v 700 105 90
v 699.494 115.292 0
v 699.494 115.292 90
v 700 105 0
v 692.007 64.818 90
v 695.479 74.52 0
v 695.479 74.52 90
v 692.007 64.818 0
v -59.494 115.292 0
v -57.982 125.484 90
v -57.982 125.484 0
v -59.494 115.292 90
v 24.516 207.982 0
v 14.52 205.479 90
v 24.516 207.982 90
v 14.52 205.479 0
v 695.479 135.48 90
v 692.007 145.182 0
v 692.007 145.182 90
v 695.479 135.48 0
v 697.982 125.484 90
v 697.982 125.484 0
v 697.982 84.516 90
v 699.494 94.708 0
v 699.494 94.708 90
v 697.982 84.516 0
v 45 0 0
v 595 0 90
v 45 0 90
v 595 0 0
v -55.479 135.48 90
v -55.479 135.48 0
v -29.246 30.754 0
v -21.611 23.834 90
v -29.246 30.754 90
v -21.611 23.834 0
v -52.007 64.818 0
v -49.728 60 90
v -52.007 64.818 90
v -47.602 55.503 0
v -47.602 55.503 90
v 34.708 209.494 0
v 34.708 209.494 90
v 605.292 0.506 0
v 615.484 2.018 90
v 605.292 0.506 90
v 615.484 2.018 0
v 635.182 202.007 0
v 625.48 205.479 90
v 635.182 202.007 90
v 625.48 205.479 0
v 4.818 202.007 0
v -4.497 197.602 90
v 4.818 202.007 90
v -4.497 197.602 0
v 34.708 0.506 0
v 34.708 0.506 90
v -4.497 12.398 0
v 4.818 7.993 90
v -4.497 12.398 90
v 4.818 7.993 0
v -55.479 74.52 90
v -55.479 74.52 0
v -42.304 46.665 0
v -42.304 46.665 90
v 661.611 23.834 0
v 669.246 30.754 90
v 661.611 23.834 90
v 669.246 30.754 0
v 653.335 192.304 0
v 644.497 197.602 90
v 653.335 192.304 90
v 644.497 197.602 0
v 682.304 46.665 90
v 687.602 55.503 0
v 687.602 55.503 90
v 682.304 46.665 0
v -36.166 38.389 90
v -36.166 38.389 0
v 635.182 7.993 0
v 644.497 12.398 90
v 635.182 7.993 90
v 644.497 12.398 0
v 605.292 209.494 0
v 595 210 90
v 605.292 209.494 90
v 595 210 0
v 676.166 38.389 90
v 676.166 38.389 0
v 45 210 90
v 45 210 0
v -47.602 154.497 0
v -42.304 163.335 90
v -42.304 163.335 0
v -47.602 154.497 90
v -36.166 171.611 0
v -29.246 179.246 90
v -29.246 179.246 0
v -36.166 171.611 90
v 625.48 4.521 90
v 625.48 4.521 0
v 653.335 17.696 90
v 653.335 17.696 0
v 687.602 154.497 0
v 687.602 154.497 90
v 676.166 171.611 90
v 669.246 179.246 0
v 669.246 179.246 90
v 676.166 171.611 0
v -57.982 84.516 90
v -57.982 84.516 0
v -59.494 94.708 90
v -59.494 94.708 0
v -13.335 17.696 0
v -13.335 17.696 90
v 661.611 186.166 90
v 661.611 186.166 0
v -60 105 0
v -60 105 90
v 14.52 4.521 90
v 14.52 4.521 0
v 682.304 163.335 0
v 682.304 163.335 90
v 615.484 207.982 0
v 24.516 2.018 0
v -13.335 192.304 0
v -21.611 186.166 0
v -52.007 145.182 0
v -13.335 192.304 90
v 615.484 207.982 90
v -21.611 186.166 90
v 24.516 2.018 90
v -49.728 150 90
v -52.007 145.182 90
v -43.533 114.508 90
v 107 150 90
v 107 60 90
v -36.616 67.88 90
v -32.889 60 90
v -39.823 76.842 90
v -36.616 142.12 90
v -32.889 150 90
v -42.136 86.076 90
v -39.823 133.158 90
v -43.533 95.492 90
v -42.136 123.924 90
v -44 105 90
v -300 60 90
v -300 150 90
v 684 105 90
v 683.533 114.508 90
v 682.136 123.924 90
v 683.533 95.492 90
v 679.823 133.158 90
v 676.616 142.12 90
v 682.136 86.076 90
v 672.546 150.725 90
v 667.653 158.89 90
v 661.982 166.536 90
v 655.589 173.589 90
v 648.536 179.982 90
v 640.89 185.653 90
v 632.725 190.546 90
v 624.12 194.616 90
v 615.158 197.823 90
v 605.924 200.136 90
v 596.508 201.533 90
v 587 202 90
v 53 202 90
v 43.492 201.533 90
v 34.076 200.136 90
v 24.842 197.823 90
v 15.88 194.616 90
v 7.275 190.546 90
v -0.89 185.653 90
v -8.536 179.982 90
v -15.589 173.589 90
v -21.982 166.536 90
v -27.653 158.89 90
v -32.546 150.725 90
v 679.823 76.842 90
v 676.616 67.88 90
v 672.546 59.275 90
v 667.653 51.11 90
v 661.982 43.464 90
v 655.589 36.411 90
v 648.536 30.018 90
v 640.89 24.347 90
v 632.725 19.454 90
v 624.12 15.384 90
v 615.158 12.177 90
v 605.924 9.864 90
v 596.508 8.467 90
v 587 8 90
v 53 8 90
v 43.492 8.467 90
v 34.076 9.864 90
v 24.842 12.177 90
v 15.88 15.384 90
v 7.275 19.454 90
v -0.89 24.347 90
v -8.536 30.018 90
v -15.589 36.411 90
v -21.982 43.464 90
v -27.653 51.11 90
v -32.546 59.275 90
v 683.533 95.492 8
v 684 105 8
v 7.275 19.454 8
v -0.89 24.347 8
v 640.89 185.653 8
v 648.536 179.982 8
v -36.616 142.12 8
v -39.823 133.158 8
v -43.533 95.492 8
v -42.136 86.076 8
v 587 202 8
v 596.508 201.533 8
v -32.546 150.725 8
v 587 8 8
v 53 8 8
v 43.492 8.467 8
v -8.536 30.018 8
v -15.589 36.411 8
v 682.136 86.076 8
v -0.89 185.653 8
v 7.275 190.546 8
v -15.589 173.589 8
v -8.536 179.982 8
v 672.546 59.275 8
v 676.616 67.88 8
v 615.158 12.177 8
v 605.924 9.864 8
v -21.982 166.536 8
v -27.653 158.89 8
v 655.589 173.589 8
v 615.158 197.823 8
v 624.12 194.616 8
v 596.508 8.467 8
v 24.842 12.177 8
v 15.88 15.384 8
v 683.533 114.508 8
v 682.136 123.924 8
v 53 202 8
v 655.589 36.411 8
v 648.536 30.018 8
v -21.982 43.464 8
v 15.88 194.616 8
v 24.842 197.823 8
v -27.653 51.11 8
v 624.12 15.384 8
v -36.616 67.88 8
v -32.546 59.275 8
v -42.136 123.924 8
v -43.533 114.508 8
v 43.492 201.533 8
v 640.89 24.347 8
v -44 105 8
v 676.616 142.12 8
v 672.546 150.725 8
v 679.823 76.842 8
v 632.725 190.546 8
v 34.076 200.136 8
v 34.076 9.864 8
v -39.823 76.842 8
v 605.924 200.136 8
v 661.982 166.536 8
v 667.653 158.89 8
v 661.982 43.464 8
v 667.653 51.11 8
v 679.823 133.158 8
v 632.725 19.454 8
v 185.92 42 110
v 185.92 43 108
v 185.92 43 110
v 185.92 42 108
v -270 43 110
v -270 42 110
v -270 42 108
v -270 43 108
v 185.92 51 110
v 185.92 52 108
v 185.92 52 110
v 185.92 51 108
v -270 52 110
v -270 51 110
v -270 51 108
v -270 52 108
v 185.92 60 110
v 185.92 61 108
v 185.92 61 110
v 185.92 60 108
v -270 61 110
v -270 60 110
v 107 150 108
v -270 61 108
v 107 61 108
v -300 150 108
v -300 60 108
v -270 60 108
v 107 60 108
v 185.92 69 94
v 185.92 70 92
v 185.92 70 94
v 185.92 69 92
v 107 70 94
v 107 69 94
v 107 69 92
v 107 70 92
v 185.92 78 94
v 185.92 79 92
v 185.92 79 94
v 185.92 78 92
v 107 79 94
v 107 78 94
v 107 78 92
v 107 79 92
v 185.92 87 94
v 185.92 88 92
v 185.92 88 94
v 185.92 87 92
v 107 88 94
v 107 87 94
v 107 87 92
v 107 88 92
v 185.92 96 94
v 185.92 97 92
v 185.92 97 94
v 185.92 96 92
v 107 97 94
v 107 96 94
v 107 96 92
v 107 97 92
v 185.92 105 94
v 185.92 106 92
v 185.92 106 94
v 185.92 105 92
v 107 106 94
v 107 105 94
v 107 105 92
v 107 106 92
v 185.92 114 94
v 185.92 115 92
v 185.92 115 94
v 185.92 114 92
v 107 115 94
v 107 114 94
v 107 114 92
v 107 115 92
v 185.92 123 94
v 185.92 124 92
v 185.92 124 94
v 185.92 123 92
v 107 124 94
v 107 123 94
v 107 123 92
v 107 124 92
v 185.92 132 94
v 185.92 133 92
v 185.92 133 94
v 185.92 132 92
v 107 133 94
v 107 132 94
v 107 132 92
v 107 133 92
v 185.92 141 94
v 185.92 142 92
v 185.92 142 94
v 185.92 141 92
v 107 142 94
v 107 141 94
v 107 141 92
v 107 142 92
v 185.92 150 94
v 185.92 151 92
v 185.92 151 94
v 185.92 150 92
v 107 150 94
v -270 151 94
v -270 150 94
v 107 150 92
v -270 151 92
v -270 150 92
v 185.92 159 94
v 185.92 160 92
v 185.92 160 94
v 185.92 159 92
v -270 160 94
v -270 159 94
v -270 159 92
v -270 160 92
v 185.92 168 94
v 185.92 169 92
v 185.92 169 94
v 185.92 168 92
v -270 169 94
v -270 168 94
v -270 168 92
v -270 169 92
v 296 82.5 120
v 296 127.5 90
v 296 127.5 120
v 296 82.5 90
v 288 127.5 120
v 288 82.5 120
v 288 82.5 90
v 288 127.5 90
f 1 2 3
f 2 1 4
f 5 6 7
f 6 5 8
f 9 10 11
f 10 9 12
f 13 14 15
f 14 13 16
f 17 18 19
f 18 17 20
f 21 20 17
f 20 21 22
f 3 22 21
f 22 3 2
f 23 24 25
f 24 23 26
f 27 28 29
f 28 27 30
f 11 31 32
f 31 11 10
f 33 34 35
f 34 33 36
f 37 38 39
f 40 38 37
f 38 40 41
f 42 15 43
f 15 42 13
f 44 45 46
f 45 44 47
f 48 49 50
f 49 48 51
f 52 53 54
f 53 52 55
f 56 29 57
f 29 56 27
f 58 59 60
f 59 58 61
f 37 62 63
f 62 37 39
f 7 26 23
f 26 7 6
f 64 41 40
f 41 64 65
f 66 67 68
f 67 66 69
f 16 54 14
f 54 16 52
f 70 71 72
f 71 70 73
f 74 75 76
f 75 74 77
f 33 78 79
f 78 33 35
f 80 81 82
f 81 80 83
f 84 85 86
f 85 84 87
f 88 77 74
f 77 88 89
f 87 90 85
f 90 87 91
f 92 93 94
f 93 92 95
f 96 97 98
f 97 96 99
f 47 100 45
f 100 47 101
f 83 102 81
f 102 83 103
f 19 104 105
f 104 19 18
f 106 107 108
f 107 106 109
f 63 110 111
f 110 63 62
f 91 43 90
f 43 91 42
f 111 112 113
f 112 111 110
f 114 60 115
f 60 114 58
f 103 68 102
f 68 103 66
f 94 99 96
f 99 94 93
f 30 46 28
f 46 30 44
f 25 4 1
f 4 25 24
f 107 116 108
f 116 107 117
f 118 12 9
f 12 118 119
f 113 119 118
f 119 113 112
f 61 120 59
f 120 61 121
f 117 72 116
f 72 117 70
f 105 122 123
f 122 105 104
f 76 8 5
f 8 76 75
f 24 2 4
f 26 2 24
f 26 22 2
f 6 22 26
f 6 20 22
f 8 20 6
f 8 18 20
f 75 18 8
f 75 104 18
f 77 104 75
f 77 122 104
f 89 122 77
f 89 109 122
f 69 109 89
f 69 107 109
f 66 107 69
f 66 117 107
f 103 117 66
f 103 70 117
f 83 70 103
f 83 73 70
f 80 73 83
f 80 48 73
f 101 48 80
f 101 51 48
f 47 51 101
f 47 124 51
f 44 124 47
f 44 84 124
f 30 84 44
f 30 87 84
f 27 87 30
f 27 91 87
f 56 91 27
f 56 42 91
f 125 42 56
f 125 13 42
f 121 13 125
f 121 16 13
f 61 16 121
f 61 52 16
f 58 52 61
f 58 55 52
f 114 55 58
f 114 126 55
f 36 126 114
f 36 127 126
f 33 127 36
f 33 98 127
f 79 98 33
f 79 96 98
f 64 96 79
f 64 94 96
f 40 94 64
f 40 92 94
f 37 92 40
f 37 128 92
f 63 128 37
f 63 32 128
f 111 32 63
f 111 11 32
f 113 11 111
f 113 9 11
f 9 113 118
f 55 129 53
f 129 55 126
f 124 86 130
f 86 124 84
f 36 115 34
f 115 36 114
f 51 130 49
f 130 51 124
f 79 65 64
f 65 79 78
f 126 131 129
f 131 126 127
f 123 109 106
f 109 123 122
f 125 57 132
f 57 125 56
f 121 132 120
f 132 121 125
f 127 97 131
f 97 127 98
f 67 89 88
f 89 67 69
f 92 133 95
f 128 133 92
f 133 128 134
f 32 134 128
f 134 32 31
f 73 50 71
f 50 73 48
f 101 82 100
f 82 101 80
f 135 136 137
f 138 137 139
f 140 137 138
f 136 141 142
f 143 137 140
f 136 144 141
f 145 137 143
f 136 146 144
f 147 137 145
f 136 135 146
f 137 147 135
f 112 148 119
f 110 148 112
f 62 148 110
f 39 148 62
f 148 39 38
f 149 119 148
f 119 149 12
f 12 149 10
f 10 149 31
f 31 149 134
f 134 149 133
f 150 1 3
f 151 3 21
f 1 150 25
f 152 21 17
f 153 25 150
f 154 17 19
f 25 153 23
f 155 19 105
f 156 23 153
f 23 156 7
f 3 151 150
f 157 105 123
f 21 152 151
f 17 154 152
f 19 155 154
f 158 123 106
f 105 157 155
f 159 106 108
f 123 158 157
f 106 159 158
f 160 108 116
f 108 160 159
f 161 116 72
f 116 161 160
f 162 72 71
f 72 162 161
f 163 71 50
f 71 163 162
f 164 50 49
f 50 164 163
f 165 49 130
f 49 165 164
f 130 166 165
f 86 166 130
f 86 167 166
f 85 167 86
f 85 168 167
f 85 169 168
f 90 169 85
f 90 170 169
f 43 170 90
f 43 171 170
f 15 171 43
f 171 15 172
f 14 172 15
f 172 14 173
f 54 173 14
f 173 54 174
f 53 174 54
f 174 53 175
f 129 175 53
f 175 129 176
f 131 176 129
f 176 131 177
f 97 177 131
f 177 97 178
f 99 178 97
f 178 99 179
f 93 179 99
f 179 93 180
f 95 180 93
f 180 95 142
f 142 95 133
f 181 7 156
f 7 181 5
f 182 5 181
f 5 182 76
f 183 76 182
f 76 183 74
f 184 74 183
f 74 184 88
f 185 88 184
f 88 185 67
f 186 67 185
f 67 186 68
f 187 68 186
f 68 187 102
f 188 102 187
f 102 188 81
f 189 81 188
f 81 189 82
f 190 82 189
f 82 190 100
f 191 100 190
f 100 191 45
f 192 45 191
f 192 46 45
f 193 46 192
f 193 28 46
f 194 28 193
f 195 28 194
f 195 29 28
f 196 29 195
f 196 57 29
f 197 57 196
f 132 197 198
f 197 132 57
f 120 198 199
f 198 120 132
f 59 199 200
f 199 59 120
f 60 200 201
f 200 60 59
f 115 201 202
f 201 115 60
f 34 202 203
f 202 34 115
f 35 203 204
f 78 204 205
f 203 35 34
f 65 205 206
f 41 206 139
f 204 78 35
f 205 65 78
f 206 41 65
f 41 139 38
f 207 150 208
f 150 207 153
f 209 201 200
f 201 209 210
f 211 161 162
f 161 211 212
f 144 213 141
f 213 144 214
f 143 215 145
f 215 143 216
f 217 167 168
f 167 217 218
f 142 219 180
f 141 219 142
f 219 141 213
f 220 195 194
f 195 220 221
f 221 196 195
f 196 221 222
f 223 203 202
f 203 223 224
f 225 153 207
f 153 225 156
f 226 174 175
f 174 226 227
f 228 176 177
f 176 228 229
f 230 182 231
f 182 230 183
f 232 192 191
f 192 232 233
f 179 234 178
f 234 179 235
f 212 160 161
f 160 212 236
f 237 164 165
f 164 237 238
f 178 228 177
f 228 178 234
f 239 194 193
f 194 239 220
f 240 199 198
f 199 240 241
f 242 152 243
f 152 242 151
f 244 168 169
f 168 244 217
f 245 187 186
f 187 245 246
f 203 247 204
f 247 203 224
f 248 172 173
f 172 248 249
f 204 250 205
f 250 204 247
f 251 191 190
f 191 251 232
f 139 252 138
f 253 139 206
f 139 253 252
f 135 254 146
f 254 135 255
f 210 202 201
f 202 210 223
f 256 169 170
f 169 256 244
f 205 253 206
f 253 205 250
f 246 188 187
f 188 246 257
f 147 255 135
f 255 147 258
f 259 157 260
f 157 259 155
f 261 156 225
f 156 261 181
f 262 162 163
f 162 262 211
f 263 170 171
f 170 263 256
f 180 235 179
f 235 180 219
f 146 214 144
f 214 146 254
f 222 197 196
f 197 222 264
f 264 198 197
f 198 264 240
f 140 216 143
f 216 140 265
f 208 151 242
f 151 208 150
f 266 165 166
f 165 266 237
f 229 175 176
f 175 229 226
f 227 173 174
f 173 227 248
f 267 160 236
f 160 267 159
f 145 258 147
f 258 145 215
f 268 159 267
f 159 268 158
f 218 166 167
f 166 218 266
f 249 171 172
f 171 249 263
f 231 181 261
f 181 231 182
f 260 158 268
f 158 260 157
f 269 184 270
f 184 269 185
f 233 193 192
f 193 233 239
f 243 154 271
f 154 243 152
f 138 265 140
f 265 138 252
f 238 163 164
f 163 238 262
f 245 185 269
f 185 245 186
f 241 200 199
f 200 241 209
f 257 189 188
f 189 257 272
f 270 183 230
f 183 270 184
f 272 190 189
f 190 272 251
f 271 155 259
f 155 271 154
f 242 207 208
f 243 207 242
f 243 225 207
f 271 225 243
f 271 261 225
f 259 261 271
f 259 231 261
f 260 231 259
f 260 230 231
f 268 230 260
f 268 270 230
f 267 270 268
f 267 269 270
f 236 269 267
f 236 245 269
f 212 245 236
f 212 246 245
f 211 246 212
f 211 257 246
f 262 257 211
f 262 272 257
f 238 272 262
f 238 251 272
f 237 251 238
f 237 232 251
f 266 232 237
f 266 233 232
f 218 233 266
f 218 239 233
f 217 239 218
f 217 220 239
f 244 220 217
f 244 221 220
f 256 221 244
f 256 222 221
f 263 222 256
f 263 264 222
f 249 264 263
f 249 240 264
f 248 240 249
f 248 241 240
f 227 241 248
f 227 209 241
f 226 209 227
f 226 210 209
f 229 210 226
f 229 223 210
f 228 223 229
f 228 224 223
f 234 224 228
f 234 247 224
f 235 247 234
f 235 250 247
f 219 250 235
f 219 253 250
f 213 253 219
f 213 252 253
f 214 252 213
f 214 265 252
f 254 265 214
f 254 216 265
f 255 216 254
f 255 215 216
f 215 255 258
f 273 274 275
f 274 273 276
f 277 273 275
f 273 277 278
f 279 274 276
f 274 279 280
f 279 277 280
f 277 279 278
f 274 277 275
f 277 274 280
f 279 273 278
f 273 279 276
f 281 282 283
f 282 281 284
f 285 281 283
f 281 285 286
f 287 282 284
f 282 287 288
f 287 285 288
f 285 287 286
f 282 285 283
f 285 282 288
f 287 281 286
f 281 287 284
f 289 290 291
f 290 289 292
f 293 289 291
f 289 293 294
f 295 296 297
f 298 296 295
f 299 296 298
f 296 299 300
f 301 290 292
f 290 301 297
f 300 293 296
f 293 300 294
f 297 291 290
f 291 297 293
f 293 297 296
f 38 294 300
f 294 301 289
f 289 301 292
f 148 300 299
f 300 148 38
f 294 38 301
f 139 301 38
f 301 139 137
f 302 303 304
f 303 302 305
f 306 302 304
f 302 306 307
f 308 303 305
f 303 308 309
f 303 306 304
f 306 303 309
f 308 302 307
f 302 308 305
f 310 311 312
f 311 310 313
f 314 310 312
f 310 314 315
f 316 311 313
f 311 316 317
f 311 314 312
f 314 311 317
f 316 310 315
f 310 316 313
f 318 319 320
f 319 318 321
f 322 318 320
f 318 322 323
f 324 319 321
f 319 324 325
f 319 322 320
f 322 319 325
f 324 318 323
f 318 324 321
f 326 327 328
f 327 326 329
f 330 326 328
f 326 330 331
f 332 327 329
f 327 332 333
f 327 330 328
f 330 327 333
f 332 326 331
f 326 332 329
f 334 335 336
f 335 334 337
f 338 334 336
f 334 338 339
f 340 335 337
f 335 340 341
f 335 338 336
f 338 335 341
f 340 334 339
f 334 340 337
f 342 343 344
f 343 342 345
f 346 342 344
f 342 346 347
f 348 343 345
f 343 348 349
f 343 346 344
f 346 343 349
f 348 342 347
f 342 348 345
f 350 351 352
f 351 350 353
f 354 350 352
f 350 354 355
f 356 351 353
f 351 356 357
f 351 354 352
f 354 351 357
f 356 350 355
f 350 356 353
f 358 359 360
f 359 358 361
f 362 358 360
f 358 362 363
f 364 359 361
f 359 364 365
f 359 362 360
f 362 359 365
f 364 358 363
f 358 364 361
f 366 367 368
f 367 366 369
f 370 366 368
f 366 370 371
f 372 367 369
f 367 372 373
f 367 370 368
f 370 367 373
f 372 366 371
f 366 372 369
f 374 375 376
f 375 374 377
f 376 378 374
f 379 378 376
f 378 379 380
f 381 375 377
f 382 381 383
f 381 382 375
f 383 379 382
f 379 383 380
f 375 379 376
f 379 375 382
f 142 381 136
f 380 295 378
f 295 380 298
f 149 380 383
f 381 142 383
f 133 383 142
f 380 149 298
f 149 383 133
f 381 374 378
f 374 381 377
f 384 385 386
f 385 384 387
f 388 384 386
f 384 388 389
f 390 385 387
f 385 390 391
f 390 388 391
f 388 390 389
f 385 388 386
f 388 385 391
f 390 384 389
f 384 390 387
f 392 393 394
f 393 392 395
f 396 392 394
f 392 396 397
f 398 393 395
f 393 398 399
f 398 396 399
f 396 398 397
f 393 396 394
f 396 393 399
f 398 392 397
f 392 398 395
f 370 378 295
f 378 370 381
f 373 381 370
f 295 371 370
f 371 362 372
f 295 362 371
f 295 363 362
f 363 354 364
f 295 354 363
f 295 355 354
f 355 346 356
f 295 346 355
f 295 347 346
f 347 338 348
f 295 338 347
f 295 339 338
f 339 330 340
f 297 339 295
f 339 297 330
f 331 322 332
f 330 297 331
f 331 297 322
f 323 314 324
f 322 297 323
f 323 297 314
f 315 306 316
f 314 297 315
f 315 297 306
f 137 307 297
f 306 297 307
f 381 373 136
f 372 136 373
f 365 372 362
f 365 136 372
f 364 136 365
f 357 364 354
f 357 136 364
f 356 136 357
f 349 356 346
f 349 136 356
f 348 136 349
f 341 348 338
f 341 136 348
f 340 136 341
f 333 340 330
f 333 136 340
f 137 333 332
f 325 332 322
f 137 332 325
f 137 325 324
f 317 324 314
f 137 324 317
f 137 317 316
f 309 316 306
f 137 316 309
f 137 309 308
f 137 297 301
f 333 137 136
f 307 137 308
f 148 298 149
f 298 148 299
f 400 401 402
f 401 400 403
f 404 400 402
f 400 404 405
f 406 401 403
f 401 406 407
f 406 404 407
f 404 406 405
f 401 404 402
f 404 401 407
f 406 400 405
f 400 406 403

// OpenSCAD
// Nyckelharpa — parametric STRUCTURAL-ENVELOPE scaffold (concept-only packet).
//
// Authority: pending_measurement. NOT fabrication authority.
// ---------------------------------------------------------------------------
// HONESTY BOUNDARY (read before using any value here):
//   This packet is deliberately NON-DIMENSIONAL. design.md, bom.csv,
//   cut-list.csv, and docs/parametric-design-table.md release NO absolute
//   dimensions — every symbol (L_melody[i], K_pitch[j], B_crown(x), ...) is
//   `pending_measurement`. Therefore EVERY numeric leaf value below is a
//   RENDER-ONLY PLACEHOLDER chosen only so the envelope draws; NONE is a
//   design, tuning, string, or fabrication authority. Placeholders are tagged
//   `// PLACEHOLDER`.
//   The DOCUMENTED content this file honestly encodes is the set of SYMBOLIC
//   RELATIONSHIPS from docs/parametric-design-table.md (key travel stack,
//   keybox reference height, key pitch rule) — expressed as formulas.
//   Mechanism detail (tangent contact face, guide-liner internals, sympathetic
//   damping) is intentionally OUT OF SCOPE — see design.md.
// ---------------------------------------------------------------------------
// Units: millimeters.

/* [Body envelope — D_body (PLACEHOLDER extents), keyed-fiddle body] */
body_length_mm     = 640;   // PLACEHOLDER body length (pending_measurement)
body_width_mm      = 210;   // PLACEHOLDER lower-bout width
body_depth_mm      = 90;    // PLACEHOLDER soundbox depth
wall_thk_mm        = 8;     // PLACEHOLDER wall thickness
neck_length_mm     = 300;   // PLACEHOLDER neck/keybox carrier length

/* [Stringing envelope — L_melody, P_sym counts; all PLACEHOLDER] */
melody_count       = 3;     // PLACEHOLDER melody course count (no tuning claim)
sympathetic_count  = 12;    // PLACEHOLDER sympathetic count (no scale claim)
string_band_frac   = 0.82;  // PLACEHOLDER speaking band as fraction of scale

/* [Keybox envelope — K_pitch[j], T_key[j], guide stack; all PLACEHOLDER] */
key_count          = 37;    // PLACEHOLDER key count (no scale authority)
key_pitch_mm       = 11;    // PLACEHOLDER K_pitch center spacing
key_travel_mm      = 14;    // PLACEHOLDER T_key useful travel
guide_side_mm      = 0.3;   // PLACEHOLDER C_guide_side
guide_vert_mm      = 0.3;   // PLACEHOLDER C_guide_vertical
finish_allow_mm    = 0.1;   // PLACEHOLDER finish_allowance
season_allow_mm    = 0.2;   // PLACEHOLDER seasonal_allowance
tangent_height_mm  = 10;    // PLACEHOLDER H_tangent contact height
keybox_width_mm    = 90;    // PLACEHOLDER keybox width

/* [Bridge envelope — B_crown; PLACEHOLDER] */
bridge_height_mm   = 30;    // PLACEHOLDER bridge height (crown pending)
bow_clear_mm       = 8;     // PLACEHOLDER bow clearance envelope

// ---------------------------------------------------------------------------
// Derived geometry — DOCUMENTED symbolic relationships as formulas
// (docs/parametric-design-table.md). Honest, source-traceable part of model.
// ---------------------------------------------------------------------------

// useful key travel = engagement + overtravel + stop compression (placeholders).
overtravel_mm = 2;              // PLACEHOLDER overtravel_allowance
stop_comp_mm  = 1;              // PLACEHOLDER stop_compression_allowance
function key_travel_stack(eng, over, comp) = eng + over + comp;
T_key_min = key_travel_stack(key_travel_mm - overtravel_mm - stop_comp_mm,
                             overtravel_mm, stop_comp_mm);

// guide clearance stack = side + vertical + finish + seasonal.
function guide_total(side, vert, fin, seas) = side + vert + fin + seas;
C_guide_total = guide_total(guide_side_mm, guide_vert_mm, finish_allow_mm, season_allow_mm);

// key pitch >= max(player access, tangent mount + guide wall).
keybox_length_mm = key_count * key_pitch_mm;

// keybox_reference_height = f(D_body, path, H_tangent, C_release, service).
keybox_ref_height_mm = tangent_height_mm + bow_clear_mm;  // envelope proxy

scale_len_mm = neck_length_mm + body_length_mm * 0.4;      // envelope proxy
string_band_len_mm = scale_len_mm * string_band_frac;

module body_shell() {
  difference() {
    hull() {
      for (x = [body_depth_mm/2, body_length_mm - body_depth_mm/2])
        translate([x, body_width_mm/2, 0])
          cylinder(h = body_depth_mm, r = body_width_mm/2, $fn = 64);
    }
    translate([wall_thk_mm, wall_thk_mm, wall_thk_mm])
      hull() {
        for (x = [body_depth_mm/2, body_length_mm - body_depth_mm/2 - 2*wall_thk_mm])
          translate([x, body_width_mm/2 - wall_thk_mm, 0])
            cylinder(h = body_depth_mm, r = body_width_mm/2 - wall_thk_mm, $fn = 64);
      }
  }
}

module keybox_carrier() {
  // Keybox cassette running along the neck carrier over the melody strings.
  translate([-neck_length_mm, body_width_mm/2 - keybox_width_mm/2, body_depth_mm])
    cube([keybox_length_mm, keybox_width_mm, keybox_ref_height_mm]);
}

module string_band() {
  // Melody + sympathetic lanes over the speaking band (envelope only).
  total = melody_count + sympathetic_count;
  for (i = [0 : total-1])
    translate([-neck_length_mm*0.9,
               body_width_mm*0.2 + (body_width_mm*0.6) * i / (total-1),
               body_depth_mm + ((i < melody_count) ? keybox_ref_height_mm : 2)])
      cube([string_band_len_mm, 1.0, 2]);   // 2 mm PLACEHOLDER string standoff
}

module bridge_blank() {
  translate([body_length_mm*0.45, body_width_mm/2 - keybox_width_mm/4, body_depth_mm])
    cube([8, keybox_width_mm/2, bridge_height_mm]);  // crown solved later
}

module nyckelharpa_assembly() {
  body_shell();
  keybox_carrier();
  string_band();
  bridge_blank();
}

nyckelharpa_assembly();

echo(str("T_key_min_mm=", T_key_min));
echo(str("C_guide_total_mm=", C_guide_total));
echo(str("keybox_length_mm=", keybox_length_mm));
echo(str("keybox_ref_height_mm=", keybox_ref_height_mm));
echo("AUTHORITY=pending_measurement; all leaf values are render-only placeholders.");
